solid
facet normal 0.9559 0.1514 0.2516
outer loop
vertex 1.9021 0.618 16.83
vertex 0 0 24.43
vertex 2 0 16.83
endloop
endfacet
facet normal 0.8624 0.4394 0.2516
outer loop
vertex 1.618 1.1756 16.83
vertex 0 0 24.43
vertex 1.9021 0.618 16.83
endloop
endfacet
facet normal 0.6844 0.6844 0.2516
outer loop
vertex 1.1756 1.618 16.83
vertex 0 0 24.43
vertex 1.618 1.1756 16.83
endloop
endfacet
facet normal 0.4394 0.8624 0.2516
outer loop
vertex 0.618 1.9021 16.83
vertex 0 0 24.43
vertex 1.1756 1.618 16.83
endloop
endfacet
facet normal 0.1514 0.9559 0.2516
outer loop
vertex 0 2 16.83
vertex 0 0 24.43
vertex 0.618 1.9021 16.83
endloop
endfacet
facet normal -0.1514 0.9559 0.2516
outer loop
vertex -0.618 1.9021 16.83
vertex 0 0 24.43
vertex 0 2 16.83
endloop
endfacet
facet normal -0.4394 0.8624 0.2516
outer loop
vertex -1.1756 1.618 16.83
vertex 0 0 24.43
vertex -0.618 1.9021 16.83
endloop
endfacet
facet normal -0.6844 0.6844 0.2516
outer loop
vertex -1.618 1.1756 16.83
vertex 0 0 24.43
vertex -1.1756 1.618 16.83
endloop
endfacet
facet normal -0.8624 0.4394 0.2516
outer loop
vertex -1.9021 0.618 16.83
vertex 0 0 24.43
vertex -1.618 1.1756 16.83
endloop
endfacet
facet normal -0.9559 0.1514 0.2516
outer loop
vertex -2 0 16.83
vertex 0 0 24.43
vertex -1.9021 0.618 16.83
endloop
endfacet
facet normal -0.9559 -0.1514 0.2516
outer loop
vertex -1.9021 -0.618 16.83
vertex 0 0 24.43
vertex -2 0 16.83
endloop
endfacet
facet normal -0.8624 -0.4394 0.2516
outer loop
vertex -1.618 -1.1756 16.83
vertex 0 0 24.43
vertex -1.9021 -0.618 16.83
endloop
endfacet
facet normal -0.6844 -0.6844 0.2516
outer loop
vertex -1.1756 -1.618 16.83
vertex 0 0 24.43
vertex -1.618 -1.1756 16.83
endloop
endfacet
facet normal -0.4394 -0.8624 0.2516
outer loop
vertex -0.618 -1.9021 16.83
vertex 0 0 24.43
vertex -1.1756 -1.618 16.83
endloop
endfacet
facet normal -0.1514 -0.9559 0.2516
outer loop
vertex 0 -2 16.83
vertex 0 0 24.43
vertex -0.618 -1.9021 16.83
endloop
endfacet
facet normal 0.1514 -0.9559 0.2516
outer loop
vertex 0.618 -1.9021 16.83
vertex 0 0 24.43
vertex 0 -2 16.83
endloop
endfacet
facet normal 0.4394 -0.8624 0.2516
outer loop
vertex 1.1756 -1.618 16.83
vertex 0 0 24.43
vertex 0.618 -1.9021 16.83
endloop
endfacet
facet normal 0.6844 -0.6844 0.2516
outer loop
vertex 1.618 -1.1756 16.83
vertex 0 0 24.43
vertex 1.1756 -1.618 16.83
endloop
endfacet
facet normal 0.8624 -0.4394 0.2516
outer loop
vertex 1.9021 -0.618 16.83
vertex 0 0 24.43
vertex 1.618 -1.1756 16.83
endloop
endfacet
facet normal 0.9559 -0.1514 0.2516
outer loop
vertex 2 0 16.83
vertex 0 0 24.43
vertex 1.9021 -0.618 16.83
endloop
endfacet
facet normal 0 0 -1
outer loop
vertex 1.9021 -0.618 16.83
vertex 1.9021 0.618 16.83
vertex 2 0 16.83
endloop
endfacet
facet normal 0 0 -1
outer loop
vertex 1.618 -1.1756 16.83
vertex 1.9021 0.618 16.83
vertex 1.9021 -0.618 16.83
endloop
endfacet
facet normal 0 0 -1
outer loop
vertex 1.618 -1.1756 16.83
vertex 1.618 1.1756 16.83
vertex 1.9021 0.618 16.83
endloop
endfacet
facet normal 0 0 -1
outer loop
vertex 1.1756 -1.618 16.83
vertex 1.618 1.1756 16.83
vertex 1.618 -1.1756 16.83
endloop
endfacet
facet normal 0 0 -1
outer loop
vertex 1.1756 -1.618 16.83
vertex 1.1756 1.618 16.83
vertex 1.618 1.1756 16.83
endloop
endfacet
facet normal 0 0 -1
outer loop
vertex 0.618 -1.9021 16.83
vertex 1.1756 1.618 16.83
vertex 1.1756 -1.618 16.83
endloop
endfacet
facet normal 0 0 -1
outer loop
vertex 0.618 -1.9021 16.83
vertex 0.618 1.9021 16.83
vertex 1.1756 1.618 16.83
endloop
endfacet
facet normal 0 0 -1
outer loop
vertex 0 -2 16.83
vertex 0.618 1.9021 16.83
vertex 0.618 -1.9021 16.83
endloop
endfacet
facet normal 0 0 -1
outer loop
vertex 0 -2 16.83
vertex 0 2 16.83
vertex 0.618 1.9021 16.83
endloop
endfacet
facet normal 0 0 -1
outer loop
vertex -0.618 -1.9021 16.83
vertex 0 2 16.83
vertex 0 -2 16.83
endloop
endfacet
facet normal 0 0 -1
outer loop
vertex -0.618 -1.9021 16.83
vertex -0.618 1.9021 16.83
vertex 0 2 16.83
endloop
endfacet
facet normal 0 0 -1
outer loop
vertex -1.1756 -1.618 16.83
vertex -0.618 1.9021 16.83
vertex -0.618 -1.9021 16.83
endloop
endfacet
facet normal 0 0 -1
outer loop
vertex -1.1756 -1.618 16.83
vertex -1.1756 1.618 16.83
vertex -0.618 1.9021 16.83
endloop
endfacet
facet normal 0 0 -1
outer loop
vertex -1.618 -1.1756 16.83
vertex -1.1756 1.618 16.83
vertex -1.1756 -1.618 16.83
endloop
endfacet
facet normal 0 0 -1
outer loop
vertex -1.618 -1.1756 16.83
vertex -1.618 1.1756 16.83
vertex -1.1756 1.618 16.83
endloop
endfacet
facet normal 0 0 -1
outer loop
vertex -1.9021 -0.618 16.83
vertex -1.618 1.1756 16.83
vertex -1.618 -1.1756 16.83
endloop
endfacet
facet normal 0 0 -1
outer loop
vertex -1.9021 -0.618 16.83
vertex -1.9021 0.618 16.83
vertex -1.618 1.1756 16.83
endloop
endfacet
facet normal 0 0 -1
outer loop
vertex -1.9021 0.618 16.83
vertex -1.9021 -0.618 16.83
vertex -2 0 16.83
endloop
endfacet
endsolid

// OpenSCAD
module mount_holes(){                   import("./master.dxf", layer="mount_holes");}
module mount_holes_standoffs(){         import("./master.dxf", layer="mount_holes_standoffs");}
module switch_holes(){                  import("./master.dxf", layer="switch_holes");}
module pcb_footprint(){                 import("./master.dxf", layer="pcb_footprint");}
module pcb_footprint_sharp(){           import("./master.dxf", layer="pcb_footprint_sharp");}
module pcb_footprint_offset_notched(){  import("./master.dxf", layer="pcb_footprint_offset_notched");}
module pcb_footprint_offset(){          import("./master.dxf", layer="pcb_footprint_offset");}
module mcu_hole(){                      import("./master.dxf", layer="mcu_hole_offset");}
module mcu_cover(){                      import("./master.dxf", layer="mcu_cover");}
module screw_holes(){                   import("./master.dxf", layer="screw_holes");}
module screw_head_holes(){              import("./master.dxf", layer="screw_head_holes");}
module thumb_edge(){                    import("./master.dxf", layer="thumb_edge");}
module thumb_cutout(){                  import("./master.dxf", layer="thumb_cutout");}
module bevel_high(){                    import("./master.dxf", layer="bevel_high");}
module bevel_low(){                     import("./master.dxf", layer="bevel_low");}
module bevel_join(){                    import("./master.dxf", layer="bevel_join");}
module thumb_join(){                    import("./master.dxf", layer="thumb_join");}

weight_thickness = 2; // can actually accommodate more than 2mm bc of spacers
weight_cutout_depth = 1;

plate_thickness = 3;
spacer_height = 7;   // metal pin height on sandwich style cases
spacer_support_height = 3;
spacer_support_wall_thickness = 1.5;

bevel_thickness = 8;
small_lip = 3;
big_lip = 10;

notched_lower_amount = 0;

// Manually change above lip height
above_plate_lip_height = 3; 

screw_cap_height = 3;
screw_thread_height = 8;

mcu_x_offset = 133.93;
mcu_y_offset = 84.57;
mcu_usb_center = 9.2; // subtract from mcu_x_offset
mcu_usb_width = 12;
mcu_trs_center = 48.6; // subtract from mcu_y_offset
mcu_trs_width = 12;

thumb_left_x_offset = 67.42299;
thumb_left_y_offset = 12.14371;
thumb_right_x_offset = 134.28646;
thumb_right_y_offset = 22.00477;
thumb_right_angle = 45;

switch_hole_offset = 0.0;

// Use this to test switch hole tolerances
*difference(){
    translate([0,66,0]) cube([19,19,plate_thickness]);
    translate([0,0,-0.01]) 
            linear_extrude(plate_thickness+0.1)
            offset(switch_hole_offset)
            switch_holes();
}

echo("TOTAL HEIGHT MM:", bevel_thickness+spacer_height+plate_thickness);
// translate([0,0,-bevel_thickness/2]) cube([5,5,bevel_thickness+spacer_height+plate_thickness]);

// $fn = 60;
// !union(){
//     difference(){
//         rotate_extrude()
//             bevel_high();
//         translate([0,-10,0]) cube([20,20,20]);
//     }
//     translate([0,0,0]) rotate_extrude()
//         bevel_join();
//     translate([10,0,0]) rotate_extrude()
//         bevel_low();
// }


// testing stuff
*minkowski(){
    $fn = 60;

    union(){
        difference(){
            union(){
                    // top
                    rotate_extrude()
                        bevel_high();
                    // bottom
                    rotate([180,0,0])
                        rotate_extrude()
                        bevel_high();
            }
            translate([0,-50,-50]) 
                cube([100,100,100]);
        }
    }

    difference(){
        cube([100,100,100]);

        union(){
            translate([0,0,150])
                rotate([0,45,0])
                cube([100,100,100]);    
        }
        translate([71-0.3,0,80-0.7])
            rotate([0,0,0])
            cube([100,100,100]);
    }
}


module body(){
    difference(){
        minkowski(){
           union(){
                // top
                rotate_extrude()
                    bevel_high();
                // bottom
                rotate([180,0,0])
                    rotate_extrude()
                    bevel_high();
            }

            difference(){
                linear_extrude(spacer_height+plate_thickness+above_plate_lip_height+0.001) 
                    pcb_footprint_sharp();
                // cut away thumb area
                translate([0,0,-1])
                    linear_extrude(spacer_height+plate_thickness+above_plate_lip_height+2)
                    thumb_cutout();
            }
        }

        // // Thumb cluster bevel cutout
        // #translate([66.66+4.6, 13.61, 10+spacer_height+plate_thickness-1]) // for wide cylinder
        *translate([66.66+4.6, 13.61, spacer_height+plate_thickness+3])  // for square
            rotate([90, 0, 36])
            translate([-4.6,0,-3]) // no idea what this was
            linear_extrude(100)
            // hull(){
            //     translate([50, 0, 0]) circle(d=10);
            //     circle(d=10);
            // }
            square([60,10]);

        *translate([0,0,spacer_height+plate_thickness*2])
                    linear_extrude(spacer_height+plate_thickness)
                    thumb_cutout();
    }
    
    

    *minkowski(){
        union(){
            // top
            // cylinder(bevel_thickness/4, big_lip, small_lip);
            // bottom
            
            translate([0,0,-bevel_thickness/2]) cylinder(bevel_thickness/2, small_lip, big_lip);
        }
        intersection(){
            translate([66.66, -70, -25])
                cube([100,100,50]);
            linear_extrude(spacer_height+plate_thickness+above_plate_lip_height+0.001) 
                pcb_footprint_sharp();
        }
    }

    // Thumb cluster bevel
    minkowski(){
        union(){
            // top
            rotate_extrude()
                bevel_low();
            // cylinder(bevel_thickness/4, big_lip, small_lip);
            // bottom
            rotate([180,0,0])
                    rotate_extrude()
                    bevel_high();
            // translate([0,0,-bevel_thickness/2]) cylinder(bevel_thickness/2, small_lip, big_lip);
        }
        linear_extrude(spacer_height+plate_thickness+above_plate_lip_height+0.001)
            thumb_edge();
    }

    // // Thumb cluster bevel smoothing/ramps
    //     translate([thumb_left_x_offset+14,thumb_left_y_offset+1.4, spacer_height+plate_thickness*2-2.5])
    //         rotate([90, 0, -90])
    //         rotate([-10,0,0])
    //         linear_extrude(15)
    //         bevel_high();
}

module pro_micro(){
    translate([mcu_x_offset-18, mcu_y_offset-33.3, spacer_height])
        cube([18, 33.3, 2]);
    translate([mcu_x_offset-18+9-4, mcu_y_offset-10+2, spacer_height-2])
        cube([8, 10, 2]);
}
// #pro_micro();

module cutout_weight(){
    translate([0,0,-bevel_thickness/2+plate_thickness - weight_cutout_depth])
        linear_extrude(weight_thickness)
        // Solo mode here to export the weight plate (ctrl+f projection, slice)
        difference(){
            offset(-1)
                pcb_footprint_offset();
        
            offset(1)
                spacers2D();
        }
}

module cutouts(){
    module cable_cutout(width, height, extrude_amount=big_lip){
        linear_extrude(extrude_amount+0.1)
            minkowski(){
                circle(d=2);
                translate([1,1,0]) square([width-1, height-1]);
            }
    }

    union(){
        // Above plate
        translate([0,0,-bevel_thickness/2+plate_thickness*2+spacer_height+0.01])
            linear_extrude(above_plate_lip_height+bevel_thickness-plate_thickness+0.02)
                pcb_footprint_offset_notched();
        // Below plate
        translate([0,0,-bevel_thickness/2+plate_thickness])
            linear_extrude(spacer_height)
            pcb_footprint_offset();
        // Metal weight pocket
        cutout_weight();
        // Switch holes
        translate([0,0,-bevel_thickness/2+spacer_height+plate_thickness-0.01]) 
            linear_extrude(plate_thickness+0.1)
            offset(switch_hole_offset)
            switch_holes();
        // MCU plate hole
        translate([0,0,-bevel_thickness/2+spacer_height+plate_thickness-0.01]) linear_extrude(plate_thickness+0.1) mcu_hole();
        // Screws
        union(){
            // Cap
            translate([0,0,-bevel_thickness/2-0.1]) linear_extrude(bevel_thickness/2+screw_cap_height+0.1) screw_head_holes();
            translate([0,0,-bevel_thickness/2+bevel_thickness/2+screw_cap_height-0.01]) linear_extrude(screw_thread_height) screw_holes();
        }
        // MCU USB hole
        translate([mcu_x_offset-mcu_usb_center-mcu_usb_width/2-1, big_lip+mcu_y_offset+big_lip+0.01, 1-0.4]) 
            rotate([90,0,0])
            cable_cutout(mcu_usb_width+1, spacer_height+plate_thickness*2-1-1, big_lip*2);
        // MCU TRS hole
        translate([mcu_x_offset, mcu_y_offset-mcu_trs_center-mcu_trs_width/2+0.01, 0.5]) 
            rotate([90,0,90])
            cable_cutout(mcu_usb_width-1, spacer_height+plate_thickness);

        // translate([thumb_left_x_offset-0.3, thumb_left_y_offset-1.63-5, spacer_height+plate_thickness*2+4])
        //     rotate([0,18.525,0])
        //     cube([7.865,10,30]);
    }
}

module spacers2D(){
    offset(r=spacer_support_wall_thickness)
        mount_holes_standoffs();
}

module standoffs(){
    union(){
        // Standoff/alignment pins
        translate([0,0,-bevel_thickness/2+plate_thickness])
            linear_extrude(spacer_height)
            mount_holes_standoffs();
        
        // Spacers (PCB sits on this)
        translate([0,0,-bevel_thickness/2+plate_thickness]) 
            linear_extrude(spacer_support_height)
            spacers2D();
    }

}

module main(){
    difference(){
        body();
        cutouts();
    }

    // integrate the oled cover
    // it should probably have its own thickness value but using plate_thickness
    // since it's 3mm seems fine
    translate([0,0,bevel_thickness+plate_thickness*2]) 
        linear_extrude(plate_thickness)
        mcu_cover();

}

module block(){
    translate([-20,-15,spacer_height-1.01]) cube([200, 120, 100]);
}

module preview(){
    difference(){
        union(){
            main();
            standoffs();
        }

        // Cut away front section to check thicknesses etc
        // translate([-200,-70,-50]) cube([400, 100, 100]);

        // Cut away top section
        // translate([-200,-50,spacer_height+plate_thickness+0.9]) cube([400, 200, 100]);
    }

    // Caps
    color("#333333") translate([0,0, spacer_height+plate_thickness-1+7.83]) minkowski(){
        linear_extrude(0.001)
            switch_holes();

        cylinder(7.6, 2, 0);
    }
}

should_mirror = false;
preview_mode = true;
if (preview_mode == true){
    $fn = 20;

    if (should_mirror == true) {
        translate([-150,0,0]) preview();
        translate([150,0,0]) mirror([1,0,0]) preview();
    } else {
        preview();
    }
} else {
    $fn = 80;

    difference(){
        union(){
            // Bottom left
            translate([-150,0,0]) color("#999999") translate([0,0,bevel_thickness/2]) union(){
                difference(){
                    main();
                    block();
                }
                
                standoffs();
            }

            // Bottom right
            translate([150,0,0]) mirror([1,0,0]) color("#999999") translate([0,0,bevel_thickness/2]) union(){
                difference(){
                    main();
                    block();
                }
                
                standoffs();
            }

            // Top left
            // No idea why it's off by 1
            translate([-150,0,0]) color("#444444") translate([130,0,-spacer_height+1]) rotate([0,0,180]) intersection(){
                main();
                block();
            }

            // Top right
            translate([150,0,0]) mirror([1,0,0]) color("#444444") translate([130,0,-spacer_height+1]) rotate([0,0,180]) intersection(){
                main();
                block();
            }
        }

        // translate([90,-200,-50]) cube([400, 400, 100]);
    }
}
